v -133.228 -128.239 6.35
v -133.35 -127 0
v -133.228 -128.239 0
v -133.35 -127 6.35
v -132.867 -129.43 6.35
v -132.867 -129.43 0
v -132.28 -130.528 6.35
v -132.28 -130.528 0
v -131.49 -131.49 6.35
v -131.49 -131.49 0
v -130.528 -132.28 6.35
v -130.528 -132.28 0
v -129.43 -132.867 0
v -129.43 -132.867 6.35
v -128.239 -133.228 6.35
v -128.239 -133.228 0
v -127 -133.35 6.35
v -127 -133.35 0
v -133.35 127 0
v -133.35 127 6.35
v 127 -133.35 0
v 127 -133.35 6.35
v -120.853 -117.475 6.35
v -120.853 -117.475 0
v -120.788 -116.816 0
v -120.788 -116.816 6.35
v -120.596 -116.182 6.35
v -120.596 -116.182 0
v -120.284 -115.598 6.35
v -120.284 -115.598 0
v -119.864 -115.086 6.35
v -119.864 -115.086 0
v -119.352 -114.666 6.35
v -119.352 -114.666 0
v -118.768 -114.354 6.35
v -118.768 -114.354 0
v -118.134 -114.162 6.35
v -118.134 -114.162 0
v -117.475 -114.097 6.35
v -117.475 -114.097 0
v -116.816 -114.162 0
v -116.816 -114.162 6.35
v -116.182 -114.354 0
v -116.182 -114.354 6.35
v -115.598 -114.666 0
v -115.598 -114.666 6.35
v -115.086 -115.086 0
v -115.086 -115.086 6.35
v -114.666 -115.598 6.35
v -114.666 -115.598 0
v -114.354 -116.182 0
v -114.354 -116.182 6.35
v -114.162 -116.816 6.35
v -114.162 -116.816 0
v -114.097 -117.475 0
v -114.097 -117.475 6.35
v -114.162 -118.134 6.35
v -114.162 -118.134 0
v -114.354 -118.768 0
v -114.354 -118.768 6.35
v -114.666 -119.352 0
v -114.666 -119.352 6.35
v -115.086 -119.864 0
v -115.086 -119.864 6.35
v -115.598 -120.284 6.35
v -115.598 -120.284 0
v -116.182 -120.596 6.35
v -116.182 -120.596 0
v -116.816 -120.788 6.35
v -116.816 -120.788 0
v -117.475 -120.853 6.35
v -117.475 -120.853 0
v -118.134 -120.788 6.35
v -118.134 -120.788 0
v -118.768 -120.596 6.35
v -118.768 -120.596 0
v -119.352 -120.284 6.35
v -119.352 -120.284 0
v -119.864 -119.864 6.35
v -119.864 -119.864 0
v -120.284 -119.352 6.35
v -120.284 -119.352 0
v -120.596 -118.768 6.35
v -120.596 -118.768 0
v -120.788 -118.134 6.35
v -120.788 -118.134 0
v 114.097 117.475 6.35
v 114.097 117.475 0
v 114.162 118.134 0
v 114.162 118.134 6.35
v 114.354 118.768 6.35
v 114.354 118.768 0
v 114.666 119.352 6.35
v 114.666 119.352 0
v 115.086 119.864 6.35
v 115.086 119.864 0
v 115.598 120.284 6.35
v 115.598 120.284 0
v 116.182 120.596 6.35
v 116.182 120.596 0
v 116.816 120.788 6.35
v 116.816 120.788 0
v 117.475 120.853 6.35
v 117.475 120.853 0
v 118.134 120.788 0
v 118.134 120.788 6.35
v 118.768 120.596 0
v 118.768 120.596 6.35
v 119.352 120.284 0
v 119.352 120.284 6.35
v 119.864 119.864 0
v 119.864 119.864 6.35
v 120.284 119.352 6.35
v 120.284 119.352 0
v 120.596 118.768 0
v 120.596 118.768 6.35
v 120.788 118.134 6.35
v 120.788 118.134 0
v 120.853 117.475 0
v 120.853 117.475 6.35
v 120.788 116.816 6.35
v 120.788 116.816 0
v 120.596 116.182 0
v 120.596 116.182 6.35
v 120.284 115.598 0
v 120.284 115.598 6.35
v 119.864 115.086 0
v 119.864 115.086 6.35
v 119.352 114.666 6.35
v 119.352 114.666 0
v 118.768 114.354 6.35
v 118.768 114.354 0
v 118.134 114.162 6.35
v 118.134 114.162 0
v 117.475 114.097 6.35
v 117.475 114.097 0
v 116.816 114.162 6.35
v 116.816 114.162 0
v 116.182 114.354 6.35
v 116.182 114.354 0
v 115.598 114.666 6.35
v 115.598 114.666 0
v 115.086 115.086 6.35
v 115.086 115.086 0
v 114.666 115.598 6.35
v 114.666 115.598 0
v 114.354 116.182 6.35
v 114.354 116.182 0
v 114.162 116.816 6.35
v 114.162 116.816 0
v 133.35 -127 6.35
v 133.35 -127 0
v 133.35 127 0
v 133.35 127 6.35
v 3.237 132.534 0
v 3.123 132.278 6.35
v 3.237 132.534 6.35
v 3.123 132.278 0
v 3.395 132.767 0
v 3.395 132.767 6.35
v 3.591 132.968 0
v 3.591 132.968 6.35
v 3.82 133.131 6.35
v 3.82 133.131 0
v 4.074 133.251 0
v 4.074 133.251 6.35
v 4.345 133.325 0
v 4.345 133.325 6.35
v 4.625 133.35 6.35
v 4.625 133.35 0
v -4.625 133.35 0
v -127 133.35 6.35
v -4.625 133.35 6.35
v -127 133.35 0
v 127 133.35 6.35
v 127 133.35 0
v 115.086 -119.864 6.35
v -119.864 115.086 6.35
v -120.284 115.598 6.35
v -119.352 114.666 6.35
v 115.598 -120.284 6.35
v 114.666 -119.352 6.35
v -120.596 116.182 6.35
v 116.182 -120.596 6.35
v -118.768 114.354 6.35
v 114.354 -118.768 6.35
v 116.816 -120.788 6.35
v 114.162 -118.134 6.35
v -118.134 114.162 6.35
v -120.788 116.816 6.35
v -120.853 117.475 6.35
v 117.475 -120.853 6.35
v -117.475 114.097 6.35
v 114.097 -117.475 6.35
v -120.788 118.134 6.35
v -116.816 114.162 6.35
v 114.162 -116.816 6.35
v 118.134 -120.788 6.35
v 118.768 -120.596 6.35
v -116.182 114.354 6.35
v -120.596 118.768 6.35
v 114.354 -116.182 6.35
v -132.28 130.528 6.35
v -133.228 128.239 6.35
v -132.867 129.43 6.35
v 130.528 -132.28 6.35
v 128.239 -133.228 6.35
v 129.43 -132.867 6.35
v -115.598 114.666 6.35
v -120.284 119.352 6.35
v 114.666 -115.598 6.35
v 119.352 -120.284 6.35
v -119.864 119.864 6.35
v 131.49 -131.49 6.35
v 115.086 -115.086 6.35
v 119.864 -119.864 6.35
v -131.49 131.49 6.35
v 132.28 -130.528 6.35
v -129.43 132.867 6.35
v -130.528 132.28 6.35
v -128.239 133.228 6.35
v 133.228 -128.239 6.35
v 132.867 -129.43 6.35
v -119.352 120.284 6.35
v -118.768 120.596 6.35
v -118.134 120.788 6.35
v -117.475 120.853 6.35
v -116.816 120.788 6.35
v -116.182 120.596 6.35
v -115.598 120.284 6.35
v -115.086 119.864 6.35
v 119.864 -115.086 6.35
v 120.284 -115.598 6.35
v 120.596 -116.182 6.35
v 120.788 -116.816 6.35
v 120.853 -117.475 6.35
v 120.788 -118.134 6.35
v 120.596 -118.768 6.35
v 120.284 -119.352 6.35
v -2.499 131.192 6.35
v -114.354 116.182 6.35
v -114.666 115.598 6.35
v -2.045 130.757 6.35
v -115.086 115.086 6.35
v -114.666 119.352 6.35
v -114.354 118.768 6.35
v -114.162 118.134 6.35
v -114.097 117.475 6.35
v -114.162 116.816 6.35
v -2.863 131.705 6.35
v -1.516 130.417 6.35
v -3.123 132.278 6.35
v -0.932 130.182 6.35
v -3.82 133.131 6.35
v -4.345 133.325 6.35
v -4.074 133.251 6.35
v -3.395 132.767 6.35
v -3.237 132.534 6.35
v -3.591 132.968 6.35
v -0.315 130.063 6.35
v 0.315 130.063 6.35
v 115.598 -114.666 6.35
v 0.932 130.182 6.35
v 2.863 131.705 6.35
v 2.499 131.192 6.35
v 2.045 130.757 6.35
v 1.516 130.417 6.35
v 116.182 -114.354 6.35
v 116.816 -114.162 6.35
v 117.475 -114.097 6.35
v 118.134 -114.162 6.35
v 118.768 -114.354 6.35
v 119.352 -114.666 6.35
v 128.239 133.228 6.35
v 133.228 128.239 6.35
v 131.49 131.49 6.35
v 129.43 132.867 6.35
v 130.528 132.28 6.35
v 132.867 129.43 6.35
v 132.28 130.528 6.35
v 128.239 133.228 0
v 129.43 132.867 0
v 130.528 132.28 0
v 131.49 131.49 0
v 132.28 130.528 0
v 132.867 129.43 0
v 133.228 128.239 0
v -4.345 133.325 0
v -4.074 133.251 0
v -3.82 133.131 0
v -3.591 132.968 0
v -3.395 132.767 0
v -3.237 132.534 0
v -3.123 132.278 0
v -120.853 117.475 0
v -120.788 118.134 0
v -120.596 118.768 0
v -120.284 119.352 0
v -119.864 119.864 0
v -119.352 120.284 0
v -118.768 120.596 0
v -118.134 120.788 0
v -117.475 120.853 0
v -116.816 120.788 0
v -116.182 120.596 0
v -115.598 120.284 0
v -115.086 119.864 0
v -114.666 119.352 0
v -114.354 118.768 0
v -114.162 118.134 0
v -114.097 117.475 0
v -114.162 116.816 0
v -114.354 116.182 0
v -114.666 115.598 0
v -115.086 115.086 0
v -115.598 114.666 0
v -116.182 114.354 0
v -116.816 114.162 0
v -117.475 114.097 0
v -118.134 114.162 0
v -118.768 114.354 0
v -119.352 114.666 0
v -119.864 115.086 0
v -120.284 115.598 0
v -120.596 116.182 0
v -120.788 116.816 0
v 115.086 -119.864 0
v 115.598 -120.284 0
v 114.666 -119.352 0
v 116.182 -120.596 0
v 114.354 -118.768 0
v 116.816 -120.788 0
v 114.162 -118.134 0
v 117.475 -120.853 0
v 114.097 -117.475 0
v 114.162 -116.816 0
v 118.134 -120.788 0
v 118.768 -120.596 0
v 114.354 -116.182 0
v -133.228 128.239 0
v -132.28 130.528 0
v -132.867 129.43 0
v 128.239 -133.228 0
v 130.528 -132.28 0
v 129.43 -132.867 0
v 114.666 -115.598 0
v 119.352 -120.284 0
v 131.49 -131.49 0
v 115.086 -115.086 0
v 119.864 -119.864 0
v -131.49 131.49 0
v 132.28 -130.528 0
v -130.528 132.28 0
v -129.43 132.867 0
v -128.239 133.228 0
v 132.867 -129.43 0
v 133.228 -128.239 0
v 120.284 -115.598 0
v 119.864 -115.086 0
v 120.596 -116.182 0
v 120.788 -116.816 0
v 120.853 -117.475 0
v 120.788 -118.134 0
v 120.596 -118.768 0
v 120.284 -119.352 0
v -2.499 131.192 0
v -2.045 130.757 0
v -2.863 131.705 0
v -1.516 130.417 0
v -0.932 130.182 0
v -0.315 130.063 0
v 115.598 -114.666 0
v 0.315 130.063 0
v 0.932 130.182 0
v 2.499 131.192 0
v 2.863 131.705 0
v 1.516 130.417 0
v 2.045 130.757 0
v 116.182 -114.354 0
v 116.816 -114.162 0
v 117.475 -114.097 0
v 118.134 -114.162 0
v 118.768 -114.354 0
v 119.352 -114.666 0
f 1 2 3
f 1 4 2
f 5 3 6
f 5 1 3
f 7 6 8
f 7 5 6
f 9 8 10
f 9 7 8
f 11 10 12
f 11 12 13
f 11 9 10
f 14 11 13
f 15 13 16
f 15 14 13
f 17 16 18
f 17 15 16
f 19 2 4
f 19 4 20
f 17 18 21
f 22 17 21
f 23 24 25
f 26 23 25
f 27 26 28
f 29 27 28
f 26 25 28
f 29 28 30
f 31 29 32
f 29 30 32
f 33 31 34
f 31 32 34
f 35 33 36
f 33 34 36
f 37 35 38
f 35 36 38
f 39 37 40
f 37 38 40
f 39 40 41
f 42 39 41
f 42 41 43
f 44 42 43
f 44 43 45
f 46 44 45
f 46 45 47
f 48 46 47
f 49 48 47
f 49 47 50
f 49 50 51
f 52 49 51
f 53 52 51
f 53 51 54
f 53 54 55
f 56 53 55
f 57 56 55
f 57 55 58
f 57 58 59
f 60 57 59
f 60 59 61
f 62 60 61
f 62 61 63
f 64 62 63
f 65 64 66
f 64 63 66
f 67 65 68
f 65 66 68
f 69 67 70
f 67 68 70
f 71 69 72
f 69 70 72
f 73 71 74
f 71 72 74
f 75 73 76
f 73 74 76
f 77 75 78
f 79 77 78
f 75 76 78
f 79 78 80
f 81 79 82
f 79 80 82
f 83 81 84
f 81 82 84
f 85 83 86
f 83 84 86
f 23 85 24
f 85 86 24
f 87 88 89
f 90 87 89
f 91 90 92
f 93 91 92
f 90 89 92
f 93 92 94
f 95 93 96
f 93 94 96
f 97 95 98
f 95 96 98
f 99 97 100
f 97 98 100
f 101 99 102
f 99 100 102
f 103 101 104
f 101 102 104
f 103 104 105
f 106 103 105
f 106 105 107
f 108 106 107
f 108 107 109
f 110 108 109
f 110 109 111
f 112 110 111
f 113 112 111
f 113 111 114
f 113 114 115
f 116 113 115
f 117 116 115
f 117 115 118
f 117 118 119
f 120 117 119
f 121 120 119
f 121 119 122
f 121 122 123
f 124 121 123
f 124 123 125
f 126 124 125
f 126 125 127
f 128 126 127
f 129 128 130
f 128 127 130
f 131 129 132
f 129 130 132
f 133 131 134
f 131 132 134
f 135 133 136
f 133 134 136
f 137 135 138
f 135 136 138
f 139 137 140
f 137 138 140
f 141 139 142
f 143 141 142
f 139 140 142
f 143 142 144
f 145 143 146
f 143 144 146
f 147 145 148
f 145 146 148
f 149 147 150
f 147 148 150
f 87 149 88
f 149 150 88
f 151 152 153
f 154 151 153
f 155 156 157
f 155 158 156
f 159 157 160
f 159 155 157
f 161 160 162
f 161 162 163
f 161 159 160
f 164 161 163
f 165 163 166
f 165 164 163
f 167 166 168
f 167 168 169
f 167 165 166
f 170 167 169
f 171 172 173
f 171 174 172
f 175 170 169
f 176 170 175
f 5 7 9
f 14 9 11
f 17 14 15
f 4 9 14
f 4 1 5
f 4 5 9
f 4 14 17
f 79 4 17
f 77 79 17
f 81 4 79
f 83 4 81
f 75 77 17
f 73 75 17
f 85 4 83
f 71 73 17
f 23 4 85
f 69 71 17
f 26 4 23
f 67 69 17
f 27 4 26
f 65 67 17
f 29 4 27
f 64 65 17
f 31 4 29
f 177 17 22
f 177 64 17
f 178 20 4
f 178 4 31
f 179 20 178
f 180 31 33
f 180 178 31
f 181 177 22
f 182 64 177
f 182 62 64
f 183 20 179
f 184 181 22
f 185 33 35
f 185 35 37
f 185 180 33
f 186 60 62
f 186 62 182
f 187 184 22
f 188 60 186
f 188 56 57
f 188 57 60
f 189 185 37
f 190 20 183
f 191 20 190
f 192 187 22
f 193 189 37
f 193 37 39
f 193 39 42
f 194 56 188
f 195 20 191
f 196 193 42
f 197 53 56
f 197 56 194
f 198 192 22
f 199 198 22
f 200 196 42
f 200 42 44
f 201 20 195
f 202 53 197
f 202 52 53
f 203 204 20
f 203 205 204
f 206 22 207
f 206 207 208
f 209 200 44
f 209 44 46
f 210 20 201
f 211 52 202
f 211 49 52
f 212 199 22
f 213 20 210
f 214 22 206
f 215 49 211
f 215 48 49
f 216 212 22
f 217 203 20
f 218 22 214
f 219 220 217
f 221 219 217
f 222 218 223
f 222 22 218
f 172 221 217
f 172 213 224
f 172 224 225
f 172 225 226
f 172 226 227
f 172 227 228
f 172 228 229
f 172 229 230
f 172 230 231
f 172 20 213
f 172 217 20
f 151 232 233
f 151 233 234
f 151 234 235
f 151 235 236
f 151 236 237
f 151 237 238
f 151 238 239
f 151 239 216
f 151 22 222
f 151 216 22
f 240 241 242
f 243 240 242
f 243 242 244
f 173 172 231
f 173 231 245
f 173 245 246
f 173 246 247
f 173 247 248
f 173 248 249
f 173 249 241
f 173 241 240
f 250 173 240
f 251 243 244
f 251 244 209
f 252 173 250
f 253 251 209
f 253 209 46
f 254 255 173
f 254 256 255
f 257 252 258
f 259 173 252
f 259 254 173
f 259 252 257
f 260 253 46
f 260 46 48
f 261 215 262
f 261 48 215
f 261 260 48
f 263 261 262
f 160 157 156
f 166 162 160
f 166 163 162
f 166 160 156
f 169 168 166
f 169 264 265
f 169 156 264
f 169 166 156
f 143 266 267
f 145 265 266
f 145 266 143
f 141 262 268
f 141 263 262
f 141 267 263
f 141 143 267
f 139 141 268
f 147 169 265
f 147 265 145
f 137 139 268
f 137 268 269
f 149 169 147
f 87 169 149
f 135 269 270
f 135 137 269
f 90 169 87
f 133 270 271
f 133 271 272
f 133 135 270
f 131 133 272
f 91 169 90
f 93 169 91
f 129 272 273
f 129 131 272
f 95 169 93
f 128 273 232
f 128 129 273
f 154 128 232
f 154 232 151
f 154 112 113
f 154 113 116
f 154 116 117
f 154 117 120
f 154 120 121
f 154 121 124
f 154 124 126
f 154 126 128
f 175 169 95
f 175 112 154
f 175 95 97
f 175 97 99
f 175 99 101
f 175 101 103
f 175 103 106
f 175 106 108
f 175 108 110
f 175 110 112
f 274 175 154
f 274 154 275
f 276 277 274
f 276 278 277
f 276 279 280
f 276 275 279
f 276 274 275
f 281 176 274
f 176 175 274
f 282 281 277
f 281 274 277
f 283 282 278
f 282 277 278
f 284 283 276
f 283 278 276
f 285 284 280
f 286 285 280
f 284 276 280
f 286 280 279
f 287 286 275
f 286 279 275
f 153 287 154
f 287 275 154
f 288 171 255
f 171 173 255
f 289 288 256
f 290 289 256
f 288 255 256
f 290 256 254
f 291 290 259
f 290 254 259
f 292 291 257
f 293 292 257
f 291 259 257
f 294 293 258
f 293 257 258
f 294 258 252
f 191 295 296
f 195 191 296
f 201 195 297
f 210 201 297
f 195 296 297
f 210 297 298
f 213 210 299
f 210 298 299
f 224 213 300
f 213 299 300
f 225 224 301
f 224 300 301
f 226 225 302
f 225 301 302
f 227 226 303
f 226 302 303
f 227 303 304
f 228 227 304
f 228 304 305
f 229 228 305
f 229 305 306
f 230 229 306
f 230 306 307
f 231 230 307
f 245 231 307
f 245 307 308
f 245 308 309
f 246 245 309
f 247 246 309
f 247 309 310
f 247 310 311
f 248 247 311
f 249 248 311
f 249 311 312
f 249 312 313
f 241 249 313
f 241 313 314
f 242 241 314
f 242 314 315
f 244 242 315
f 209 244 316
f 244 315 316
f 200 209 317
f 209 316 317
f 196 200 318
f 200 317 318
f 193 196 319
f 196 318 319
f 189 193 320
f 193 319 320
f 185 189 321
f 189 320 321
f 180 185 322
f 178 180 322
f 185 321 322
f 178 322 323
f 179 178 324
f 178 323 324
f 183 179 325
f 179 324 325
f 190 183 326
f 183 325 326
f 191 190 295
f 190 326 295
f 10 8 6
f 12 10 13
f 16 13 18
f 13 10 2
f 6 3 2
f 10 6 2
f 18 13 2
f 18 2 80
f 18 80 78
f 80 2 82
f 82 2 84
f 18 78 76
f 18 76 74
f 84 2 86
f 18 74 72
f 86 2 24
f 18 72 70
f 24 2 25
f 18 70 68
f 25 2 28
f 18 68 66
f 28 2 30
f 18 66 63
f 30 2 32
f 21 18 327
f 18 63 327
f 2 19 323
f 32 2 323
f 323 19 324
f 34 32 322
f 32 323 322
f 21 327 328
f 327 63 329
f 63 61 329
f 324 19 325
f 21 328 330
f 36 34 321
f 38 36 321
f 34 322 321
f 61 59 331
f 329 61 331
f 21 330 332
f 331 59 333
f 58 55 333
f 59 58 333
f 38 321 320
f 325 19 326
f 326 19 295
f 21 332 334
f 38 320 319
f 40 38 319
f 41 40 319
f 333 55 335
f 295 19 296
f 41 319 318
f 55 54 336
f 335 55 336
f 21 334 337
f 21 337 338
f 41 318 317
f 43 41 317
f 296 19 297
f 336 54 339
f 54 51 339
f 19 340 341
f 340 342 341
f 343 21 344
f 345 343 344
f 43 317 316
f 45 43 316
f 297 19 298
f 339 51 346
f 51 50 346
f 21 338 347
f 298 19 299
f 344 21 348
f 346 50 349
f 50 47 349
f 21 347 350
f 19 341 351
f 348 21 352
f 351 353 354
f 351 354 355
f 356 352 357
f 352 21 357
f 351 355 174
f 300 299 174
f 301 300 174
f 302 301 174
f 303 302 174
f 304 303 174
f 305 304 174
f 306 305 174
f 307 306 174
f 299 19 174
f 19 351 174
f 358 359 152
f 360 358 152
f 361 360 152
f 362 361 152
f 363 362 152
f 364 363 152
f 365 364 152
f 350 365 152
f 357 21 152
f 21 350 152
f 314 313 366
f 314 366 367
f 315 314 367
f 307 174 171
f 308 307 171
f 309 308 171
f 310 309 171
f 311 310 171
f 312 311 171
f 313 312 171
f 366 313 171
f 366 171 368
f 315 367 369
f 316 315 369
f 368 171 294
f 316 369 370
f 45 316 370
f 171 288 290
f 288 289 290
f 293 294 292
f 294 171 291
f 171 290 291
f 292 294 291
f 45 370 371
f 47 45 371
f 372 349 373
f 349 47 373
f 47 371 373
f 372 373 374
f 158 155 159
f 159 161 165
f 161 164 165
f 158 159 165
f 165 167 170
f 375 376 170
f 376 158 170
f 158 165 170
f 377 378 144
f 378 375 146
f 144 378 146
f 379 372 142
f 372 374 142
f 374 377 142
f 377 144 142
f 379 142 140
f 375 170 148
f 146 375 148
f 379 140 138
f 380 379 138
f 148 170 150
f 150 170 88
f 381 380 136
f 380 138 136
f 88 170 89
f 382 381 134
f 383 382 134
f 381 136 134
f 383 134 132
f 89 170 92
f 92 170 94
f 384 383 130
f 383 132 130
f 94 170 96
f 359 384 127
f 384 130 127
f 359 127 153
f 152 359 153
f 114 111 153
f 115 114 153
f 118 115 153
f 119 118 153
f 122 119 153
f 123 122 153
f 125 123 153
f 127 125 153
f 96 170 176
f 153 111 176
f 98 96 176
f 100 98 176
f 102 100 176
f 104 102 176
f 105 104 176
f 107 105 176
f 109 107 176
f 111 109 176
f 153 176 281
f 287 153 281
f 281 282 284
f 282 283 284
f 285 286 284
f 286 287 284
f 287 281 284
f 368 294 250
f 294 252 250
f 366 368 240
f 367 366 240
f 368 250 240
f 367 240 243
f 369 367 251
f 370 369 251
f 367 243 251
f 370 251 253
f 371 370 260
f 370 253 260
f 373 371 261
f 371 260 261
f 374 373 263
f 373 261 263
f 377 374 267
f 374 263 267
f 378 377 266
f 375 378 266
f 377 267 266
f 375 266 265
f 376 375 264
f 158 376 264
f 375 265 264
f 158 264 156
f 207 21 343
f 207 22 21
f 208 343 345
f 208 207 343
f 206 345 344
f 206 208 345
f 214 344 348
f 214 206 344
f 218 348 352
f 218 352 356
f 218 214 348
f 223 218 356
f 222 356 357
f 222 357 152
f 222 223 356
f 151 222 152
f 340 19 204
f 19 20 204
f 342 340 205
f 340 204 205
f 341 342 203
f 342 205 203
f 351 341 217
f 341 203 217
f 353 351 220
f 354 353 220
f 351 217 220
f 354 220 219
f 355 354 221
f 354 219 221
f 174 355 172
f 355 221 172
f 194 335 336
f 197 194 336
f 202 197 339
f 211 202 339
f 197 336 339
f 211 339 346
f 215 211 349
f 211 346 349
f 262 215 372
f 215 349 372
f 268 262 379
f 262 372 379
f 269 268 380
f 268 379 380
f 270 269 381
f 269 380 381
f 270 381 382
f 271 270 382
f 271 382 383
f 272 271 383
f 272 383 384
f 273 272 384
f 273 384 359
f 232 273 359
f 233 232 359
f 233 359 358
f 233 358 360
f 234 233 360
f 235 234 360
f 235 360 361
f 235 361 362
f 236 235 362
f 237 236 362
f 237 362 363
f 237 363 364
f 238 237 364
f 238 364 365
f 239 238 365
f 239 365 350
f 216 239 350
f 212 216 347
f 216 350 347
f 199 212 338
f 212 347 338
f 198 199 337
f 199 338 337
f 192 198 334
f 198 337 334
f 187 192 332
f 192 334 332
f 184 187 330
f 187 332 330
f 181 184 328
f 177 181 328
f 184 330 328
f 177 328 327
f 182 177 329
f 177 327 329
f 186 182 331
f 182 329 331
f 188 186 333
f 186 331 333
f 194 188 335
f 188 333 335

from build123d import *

# Parameters (mm, degrees)
SKETCH1_W               = 266.7
SKETCH1_H               = 266.7
BOSS_EXTRUDE1_DEPTH     = 6.35
F_1_4_CLEARANCE_HOLE1_D = 6.7564
FILLET1_R               = 6.35
SKETCH4_R               = 3.302
CUT_EXTRUDE1_DEPTH      = 7.35
FILLET2_R               = 1.5875


with BuildPart() as part:
    # Sketch1 → Boss-Extrude1 (new body)
    with BuildSketch(Plane.XY):
        Rectangle(SKETCH1_W, SKETCH1_H)
    extrude(amount=BOSS_EXTRUDE1_DEPTH)

    # 1/4 Clearance Hole1 (through all)
    with Locations(Plane.XY.offset(6.35)):
        with Locations((-117.475, 117.475), (-117.475, -117.475), (117.475, -117.475), (117.475, 117.475)):
            Hole(F_1_4_CLEARANCE_HOLE1_D / 2)

    # Fillet1
    fillet1_edges = [part.edges().sort_by_distance(p)[0] for p in [
        (133.35, -133.35, 3.175),
        (-133.35, -133.35, 3.175),
        (-133.35, 133.35, 3.175),
        (133.35, 133.35, 3.175),
    ]]
    fillet(fillet1_edges, radius=FILLET1_R)

    # Sketch4 → Cut-Extrude1 (cut, through all)
    with BuildSketch(Plane.XY.offset(6.35)):
        with Locations((0, 133.35)):
            Circle(SKETCH4_R)
    extrude(amount=-CUT_EXTRUDE1_DEPTH, mode=Mode.SUBTRACT)

    # Fillet2
    fillet2_edges = [part.edges().sort_by_distance(p)[0] for p in [
        (-3.302, 133.35, 3.175),
        (3.302, 133.35, 3.175),
    ]]
    fillet(fillet2_edges, radius=FILLET2_R)


solid = part.part
